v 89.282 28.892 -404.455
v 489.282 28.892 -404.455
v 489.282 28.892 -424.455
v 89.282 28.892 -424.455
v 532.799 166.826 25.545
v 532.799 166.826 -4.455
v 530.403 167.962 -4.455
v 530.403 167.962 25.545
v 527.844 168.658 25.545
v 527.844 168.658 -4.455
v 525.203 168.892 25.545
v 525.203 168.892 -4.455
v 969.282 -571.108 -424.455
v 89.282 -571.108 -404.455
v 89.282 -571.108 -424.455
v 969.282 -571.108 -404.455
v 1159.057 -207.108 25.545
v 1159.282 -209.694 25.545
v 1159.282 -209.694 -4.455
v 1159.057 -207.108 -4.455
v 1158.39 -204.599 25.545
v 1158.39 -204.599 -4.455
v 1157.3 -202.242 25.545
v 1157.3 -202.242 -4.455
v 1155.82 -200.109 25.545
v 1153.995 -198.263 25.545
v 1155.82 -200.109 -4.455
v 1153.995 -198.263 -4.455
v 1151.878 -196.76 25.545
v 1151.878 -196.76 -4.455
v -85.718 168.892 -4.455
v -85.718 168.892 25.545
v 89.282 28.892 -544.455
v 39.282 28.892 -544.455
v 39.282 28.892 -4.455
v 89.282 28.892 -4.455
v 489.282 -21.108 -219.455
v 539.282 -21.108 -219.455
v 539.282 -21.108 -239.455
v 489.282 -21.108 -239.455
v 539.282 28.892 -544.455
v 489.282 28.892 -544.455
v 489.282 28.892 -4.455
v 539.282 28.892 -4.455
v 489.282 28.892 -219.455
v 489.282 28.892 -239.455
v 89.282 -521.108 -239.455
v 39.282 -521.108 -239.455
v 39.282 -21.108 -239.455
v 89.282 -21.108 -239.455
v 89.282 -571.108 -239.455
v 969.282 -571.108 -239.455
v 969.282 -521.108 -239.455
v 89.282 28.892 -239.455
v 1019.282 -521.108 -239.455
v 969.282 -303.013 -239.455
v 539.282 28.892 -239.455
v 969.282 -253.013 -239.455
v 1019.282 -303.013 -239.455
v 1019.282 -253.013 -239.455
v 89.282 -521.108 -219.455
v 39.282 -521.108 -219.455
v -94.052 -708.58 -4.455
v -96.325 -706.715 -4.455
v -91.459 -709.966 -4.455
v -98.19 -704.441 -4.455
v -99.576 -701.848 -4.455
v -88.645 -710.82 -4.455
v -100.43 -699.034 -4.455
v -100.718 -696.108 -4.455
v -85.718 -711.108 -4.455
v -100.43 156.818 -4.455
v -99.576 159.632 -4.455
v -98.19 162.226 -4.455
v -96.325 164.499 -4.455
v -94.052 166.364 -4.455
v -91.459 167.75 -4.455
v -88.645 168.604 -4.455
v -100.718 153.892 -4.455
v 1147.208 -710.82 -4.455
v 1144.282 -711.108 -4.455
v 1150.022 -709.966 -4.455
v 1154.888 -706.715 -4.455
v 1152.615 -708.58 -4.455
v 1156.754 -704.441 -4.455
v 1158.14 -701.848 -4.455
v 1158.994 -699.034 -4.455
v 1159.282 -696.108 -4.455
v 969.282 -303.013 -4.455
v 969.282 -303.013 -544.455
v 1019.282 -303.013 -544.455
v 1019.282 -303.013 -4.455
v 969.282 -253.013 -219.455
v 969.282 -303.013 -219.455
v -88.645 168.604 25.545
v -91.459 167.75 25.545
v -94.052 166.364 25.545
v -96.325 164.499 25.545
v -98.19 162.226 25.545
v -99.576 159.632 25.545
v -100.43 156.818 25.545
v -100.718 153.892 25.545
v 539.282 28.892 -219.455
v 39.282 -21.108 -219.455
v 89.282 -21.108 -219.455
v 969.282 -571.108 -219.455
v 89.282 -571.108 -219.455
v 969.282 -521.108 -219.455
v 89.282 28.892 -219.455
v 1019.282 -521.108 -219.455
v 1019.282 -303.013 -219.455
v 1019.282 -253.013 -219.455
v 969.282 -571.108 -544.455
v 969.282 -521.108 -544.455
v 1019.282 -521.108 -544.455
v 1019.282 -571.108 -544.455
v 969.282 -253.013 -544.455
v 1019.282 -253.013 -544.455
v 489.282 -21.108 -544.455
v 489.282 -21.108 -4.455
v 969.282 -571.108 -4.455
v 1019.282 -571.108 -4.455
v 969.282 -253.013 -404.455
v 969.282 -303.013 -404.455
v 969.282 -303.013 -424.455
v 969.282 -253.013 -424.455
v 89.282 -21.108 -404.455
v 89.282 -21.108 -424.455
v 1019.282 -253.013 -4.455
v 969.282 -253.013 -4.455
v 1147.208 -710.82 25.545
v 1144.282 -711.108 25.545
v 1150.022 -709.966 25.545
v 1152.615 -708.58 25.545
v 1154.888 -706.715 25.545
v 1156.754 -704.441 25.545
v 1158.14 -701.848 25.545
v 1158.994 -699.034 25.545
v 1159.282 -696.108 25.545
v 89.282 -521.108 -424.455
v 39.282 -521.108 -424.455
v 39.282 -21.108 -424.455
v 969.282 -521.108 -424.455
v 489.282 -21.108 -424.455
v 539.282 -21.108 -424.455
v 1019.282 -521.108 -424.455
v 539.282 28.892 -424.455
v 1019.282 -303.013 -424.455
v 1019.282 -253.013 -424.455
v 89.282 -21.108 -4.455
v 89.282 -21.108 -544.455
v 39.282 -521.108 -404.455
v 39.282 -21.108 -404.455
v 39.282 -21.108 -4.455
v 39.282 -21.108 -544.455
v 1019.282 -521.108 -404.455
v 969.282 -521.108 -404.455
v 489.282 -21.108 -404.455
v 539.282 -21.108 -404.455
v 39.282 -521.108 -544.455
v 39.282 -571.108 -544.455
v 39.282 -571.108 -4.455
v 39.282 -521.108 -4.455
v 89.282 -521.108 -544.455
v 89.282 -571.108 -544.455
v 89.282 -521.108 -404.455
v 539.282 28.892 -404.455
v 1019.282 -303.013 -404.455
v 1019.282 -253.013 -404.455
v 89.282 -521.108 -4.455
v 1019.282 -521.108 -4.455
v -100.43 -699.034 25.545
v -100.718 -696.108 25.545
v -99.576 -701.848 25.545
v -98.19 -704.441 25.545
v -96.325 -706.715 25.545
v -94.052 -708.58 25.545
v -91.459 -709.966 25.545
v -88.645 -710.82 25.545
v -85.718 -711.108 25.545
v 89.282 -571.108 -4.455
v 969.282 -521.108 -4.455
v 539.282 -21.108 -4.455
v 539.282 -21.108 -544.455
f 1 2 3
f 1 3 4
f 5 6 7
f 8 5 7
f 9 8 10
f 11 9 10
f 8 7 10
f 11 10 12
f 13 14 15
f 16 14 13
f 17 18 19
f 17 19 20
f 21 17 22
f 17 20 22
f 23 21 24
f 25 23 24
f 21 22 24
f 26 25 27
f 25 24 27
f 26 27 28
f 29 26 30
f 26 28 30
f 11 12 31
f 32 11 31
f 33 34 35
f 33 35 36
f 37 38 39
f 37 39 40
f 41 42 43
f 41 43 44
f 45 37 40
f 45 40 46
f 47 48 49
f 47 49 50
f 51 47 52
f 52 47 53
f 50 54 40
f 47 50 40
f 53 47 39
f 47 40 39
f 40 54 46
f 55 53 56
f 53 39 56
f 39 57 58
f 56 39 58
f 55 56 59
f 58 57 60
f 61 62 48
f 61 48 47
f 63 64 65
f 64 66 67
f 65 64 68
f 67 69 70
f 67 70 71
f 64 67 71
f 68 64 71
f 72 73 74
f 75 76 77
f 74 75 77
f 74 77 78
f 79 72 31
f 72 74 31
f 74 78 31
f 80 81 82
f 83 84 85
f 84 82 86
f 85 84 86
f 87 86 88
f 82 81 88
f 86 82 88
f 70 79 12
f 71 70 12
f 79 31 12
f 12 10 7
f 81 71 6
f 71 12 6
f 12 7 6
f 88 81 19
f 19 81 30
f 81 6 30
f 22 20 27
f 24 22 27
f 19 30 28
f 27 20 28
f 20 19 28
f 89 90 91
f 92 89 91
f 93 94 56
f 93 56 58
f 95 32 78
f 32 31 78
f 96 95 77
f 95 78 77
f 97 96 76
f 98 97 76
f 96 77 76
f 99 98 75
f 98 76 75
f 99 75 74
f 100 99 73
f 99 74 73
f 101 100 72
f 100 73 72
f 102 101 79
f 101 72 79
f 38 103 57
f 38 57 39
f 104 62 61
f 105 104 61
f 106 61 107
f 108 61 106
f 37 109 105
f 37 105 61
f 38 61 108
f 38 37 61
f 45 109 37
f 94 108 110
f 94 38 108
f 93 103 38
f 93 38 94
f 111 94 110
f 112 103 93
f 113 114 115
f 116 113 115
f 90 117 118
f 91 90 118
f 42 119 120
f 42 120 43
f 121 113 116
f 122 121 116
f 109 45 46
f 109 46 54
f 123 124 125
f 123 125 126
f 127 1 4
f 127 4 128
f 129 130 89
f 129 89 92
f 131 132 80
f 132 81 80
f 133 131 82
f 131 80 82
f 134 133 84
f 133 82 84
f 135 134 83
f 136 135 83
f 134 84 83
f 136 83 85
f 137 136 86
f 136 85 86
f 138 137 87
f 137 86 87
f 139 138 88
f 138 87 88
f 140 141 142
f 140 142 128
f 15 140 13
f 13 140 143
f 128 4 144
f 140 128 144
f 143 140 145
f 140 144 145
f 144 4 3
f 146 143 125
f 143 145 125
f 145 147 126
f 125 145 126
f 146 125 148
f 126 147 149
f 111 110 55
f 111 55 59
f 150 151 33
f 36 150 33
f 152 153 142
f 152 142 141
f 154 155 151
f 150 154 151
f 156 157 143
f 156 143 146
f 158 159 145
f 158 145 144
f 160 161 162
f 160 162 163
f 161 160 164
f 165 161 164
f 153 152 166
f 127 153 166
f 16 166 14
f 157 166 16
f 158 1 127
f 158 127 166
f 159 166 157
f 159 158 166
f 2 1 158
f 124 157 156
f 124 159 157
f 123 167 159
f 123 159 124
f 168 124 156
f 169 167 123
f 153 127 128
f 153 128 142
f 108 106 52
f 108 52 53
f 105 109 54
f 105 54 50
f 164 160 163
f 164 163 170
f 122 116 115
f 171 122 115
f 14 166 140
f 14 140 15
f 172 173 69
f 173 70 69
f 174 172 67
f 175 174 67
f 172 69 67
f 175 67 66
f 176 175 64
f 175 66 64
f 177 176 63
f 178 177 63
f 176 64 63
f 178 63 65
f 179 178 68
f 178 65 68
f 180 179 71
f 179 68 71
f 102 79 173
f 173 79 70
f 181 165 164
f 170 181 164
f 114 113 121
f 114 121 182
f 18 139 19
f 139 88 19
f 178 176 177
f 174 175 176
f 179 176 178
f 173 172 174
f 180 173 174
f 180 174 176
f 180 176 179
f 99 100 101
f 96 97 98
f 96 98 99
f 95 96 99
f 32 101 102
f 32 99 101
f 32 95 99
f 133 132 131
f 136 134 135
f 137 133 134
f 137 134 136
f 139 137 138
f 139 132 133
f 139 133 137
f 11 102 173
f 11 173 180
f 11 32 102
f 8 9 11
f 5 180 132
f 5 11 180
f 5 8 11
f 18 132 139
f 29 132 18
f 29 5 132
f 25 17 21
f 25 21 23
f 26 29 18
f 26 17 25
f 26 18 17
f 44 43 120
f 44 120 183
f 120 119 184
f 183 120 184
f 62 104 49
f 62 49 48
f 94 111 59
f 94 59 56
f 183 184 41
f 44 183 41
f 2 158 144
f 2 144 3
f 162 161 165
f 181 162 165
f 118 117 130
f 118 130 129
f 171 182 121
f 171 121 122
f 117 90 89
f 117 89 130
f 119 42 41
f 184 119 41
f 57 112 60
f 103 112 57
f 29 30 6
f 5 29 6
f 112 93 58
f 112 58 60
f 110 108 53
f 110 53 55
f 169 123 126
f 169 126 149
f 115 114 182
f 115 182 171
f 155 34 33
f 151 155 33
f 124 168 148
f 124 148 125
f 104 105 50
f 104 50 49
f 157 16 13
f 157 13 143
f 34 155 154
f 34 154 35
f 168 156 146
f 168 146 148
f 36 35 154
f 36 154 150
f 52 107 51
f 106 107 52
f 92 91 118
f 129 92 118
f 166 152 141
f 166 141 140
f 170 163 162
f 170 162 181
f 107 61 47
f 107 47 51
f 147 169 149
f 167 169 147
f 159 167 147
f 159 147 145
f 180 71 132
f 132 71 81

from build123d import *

# Parameters (mm, degrees)
F2_START      = -4.4552753679
F0_W          = 50
F0_H          = 50
F2_DEPTH      = 540
F3_DEPTH      = 4.4552753679
F3_DEPTH_BACK = 25.5447246321
F4_START      = -404.4552753679
F4_DEPTH      = 20
F5_START      = -219.4552753679
F5_DEPTH      = 20


with BuildPart() as f2:
    # F0 (on Top) → F2 (new body)
    with BuildSketch(Plane.XY.offset(F2_START)):
        with Locations((64.2817475274, -546.1079187691)):
            Rectangle(F0_W, F0_H)
    extrude(amount=-F2_DEPTH)


with BuildPart() as f2b:
    # F0 (on Top) → F2, piece 2 (new body)
    with BuildSketch(Plane.XY.offset(F2_START)):
        with Locations((994.2817475274, -546.1079187691)):
            Rectangle(F0_W, F0_H)
    extrude(amount=-F2_DEPTH)


with BuildPart() as f2c:
    # F0 (on Top) → F2, piece 3 (new body)
    with BuildSketch(Plane.XY.offset(F2_START)):
        with Locations((994.2817475274, -278.0126806739)):
            Rectangle(F0_W, F0_H)
    extrude(amount=-F2_DEPTH)


with BuildPart() as f2d:
    # F0 (on Top) → F2, piece 4 (new body)
    with BuildSketch(Plane.XY.offset(F2_START)):
        with Locations((514.2817475274, 3.8920812309)):
            Rectangle(F0_W, F0_H)
    extrude(amount=-F2_DEPTH)


with BuildPart() as f2e:
    # F0 (on Top) → F2, piece 5 (new body)
    with BuildSketch(Plane.XY.offset(F2_START)):
        with Locations((64.2817475274, 3.8920812309)):
            Rectangle(F0_W, F0_H)
    extrude(amount=-F2_DEPTH)


with BuildPart() as f3:
    # F0 (on Top) → F3 (new body, two sides)
    with BuildSketch(Plane.XY) as f3_sk:
        with BuildLine():
            Line((525.2027132718, 168.8920812309), (-85.7182524726, 168.8920812309))
            ThreePointArc((-85.7182524726, 168.8920812309), (-96.3248541904, 164.4986829487), (-100.7182524726, 153.8920812309))
            Line((-100.7182524726, 153.8920812309), (-100.7182524726, -696.1079187691))
            ThreePointArc((-100.7182524726, -696.1079187691), (-96.3248541904, -706.7145204869), (-85.7182524726, -711.1079187691))
            Line((-85.7182524726, -711.1079187691), (1144.2817475274, -711.1079187691))
            ThreePointArc((1144.2817475274, -711.1079187691), (1154.8883492452, -706.7145204869), (1159.2817475274, -696.1079187691))
            Line((1159.2817475274, -696.1079187691), (1159.2817475274, -209.6940182526))
            ThreePointArc((1159.2817475274, -209.6940182526), (1157.2999063312, -202.2423378139), (1151.8780753461, -196.7597303451))
            Line((1151.8780753461, -196.7597303451), (532.7990410905, 166.8263691383))
            ThreePointArc((532.7990410905, 166.8263691383), (529.1388078711, 168.366443369), (525.2027132718, 168.8920812309))
        make_face()
        Polygon((39.2817475274, -21.1079187691), (39.2817475274, 28.8920812309), (89.2817475274, 28.8920812309), (489.2817475274, 28.8920812309), (539.2817475274, 28.8920812309), (1019.2817475274, -253.0126806739), (1019.2817475274, -303.0126806739), (1019.2817475274, -521.1079187691), (1019.2817475274, -571.1079187691), (969.2817475274, -571.1079187691), (89.2817475274, -571.1079187691), (39.2817475274, -571.1079187691), (39.2817475274, -521.1079187691), align=None, mode=Mode.SUBTRACT)
        Polygon((489.2817475274, 28.8920812309), (89.2817475274, 28.8920812309), (89.2817475274, -21.1079187691), (39.2817475274, -21.1079187691), (39.2817475274, -521.1079187691), (89.2817475274, -521.1079187691), (89.2817475274, -571.1079187691), (969.2817475274, -571.1079187691), (969.2817475274, -521.1079187691), (1019.2817475274, -521.1079187691), (1019.2817475274, -303.0126806739), (969.2817475274, -303.0126806739), (969.2817475274, -253.0126806739), (1019.2817475274, -253.0126806739), (539.2817475274, 28.8920812309), (539.2817475274, -21.1079187691), (489.2817475274, -21.1079187691), align=None)
        with Locations((64.2817475274, -546.1079187691)):
            Rectangle(F0_W, F0_H)
        with Locations((994.2817475274, -546.1079187691)):
            Rectangle(F0_W, F0_H)
        with Locations((994.2817475274, -278.0126806739)):
            Rectangle(F0_W, F0_H)
        with Locations((514.2817475274, 3.8920812309)):
            Rectangle(F0_W, F0_H)
        with Locations((64.2817475274, 3.8920812309)):
            Rectangle(F0_W, F0_H)
    extrude(amount=-F3_DEPTH)
    extrude(f3_sk.sketch, amount=F3_DEPTH_BACK)


with BuildPart() as f4:
    # F0 (on Top) → F4 (new body)
    with BuildSketch(Plane.XY.offset(F4_START)):
        Polygon((489.2817475274, 28.8920812309), (89.2817475274, 28.8920812309), (89.2817475274, -21.1079187691), (39.2817475274, -21.1079187691), (39.2817475274, -521.1079187691), (89.2817475274, -521.1079187691), (89.2817475274, -571.1079187691), (969.2817475274, -571.1079187691), (969.2817475274, -521.1079187691), (1019.2817475274, -521.1079187691), (1019.2817475274, -303.0126806739), (969.2817475274, -303.0126806739), (969.2817475274, -253.0126806739), (1019.2817475274, -253.0126806739), (539.2817475274, 28.8920812309), (539.2817475274, -21.1079187691), (489.2817475274, -21.1079187691), align=None)
    extrude(amount=-F4_DEPTH)


with BuildPart() as f5:
    # F0 (on Top) → F5 (new body)
    with BuildSketch(Plane.XY.offset(F5_START)):
        Polygon((489.2817475274, 28.8920812309), (89.2817475274, 28.8920812309), (89.2817475274, -21.1079187691), (39.2817475274, -21.1079187691), (39.2817475274, -521.1079187691), (89.2817475274, -521.1079187691), (89.2817475274, -571.1079187691), (969.2817475274, -571.1079187691), (969.2817475274, -521.1079187691), (1019.2817475274, -521.1079187691), (1019.2817475274, -303.0126806739), (969.2817475274, -303.0126806739), (969.2817475274, -253.0126806739), (1019.2817475274, -253.0126806739), (539.2817475274, 28.8920812309), (539.2817475274, -21.1079187691), (489.2817475274, -21.1079187691), align=None)
    extrude(amount=-F5_DEPTH)


solid = Compound([f2.part, f2b.part, f2c.part, f2d.part, f2e.part, f3.part, f4.part, f5.part])
